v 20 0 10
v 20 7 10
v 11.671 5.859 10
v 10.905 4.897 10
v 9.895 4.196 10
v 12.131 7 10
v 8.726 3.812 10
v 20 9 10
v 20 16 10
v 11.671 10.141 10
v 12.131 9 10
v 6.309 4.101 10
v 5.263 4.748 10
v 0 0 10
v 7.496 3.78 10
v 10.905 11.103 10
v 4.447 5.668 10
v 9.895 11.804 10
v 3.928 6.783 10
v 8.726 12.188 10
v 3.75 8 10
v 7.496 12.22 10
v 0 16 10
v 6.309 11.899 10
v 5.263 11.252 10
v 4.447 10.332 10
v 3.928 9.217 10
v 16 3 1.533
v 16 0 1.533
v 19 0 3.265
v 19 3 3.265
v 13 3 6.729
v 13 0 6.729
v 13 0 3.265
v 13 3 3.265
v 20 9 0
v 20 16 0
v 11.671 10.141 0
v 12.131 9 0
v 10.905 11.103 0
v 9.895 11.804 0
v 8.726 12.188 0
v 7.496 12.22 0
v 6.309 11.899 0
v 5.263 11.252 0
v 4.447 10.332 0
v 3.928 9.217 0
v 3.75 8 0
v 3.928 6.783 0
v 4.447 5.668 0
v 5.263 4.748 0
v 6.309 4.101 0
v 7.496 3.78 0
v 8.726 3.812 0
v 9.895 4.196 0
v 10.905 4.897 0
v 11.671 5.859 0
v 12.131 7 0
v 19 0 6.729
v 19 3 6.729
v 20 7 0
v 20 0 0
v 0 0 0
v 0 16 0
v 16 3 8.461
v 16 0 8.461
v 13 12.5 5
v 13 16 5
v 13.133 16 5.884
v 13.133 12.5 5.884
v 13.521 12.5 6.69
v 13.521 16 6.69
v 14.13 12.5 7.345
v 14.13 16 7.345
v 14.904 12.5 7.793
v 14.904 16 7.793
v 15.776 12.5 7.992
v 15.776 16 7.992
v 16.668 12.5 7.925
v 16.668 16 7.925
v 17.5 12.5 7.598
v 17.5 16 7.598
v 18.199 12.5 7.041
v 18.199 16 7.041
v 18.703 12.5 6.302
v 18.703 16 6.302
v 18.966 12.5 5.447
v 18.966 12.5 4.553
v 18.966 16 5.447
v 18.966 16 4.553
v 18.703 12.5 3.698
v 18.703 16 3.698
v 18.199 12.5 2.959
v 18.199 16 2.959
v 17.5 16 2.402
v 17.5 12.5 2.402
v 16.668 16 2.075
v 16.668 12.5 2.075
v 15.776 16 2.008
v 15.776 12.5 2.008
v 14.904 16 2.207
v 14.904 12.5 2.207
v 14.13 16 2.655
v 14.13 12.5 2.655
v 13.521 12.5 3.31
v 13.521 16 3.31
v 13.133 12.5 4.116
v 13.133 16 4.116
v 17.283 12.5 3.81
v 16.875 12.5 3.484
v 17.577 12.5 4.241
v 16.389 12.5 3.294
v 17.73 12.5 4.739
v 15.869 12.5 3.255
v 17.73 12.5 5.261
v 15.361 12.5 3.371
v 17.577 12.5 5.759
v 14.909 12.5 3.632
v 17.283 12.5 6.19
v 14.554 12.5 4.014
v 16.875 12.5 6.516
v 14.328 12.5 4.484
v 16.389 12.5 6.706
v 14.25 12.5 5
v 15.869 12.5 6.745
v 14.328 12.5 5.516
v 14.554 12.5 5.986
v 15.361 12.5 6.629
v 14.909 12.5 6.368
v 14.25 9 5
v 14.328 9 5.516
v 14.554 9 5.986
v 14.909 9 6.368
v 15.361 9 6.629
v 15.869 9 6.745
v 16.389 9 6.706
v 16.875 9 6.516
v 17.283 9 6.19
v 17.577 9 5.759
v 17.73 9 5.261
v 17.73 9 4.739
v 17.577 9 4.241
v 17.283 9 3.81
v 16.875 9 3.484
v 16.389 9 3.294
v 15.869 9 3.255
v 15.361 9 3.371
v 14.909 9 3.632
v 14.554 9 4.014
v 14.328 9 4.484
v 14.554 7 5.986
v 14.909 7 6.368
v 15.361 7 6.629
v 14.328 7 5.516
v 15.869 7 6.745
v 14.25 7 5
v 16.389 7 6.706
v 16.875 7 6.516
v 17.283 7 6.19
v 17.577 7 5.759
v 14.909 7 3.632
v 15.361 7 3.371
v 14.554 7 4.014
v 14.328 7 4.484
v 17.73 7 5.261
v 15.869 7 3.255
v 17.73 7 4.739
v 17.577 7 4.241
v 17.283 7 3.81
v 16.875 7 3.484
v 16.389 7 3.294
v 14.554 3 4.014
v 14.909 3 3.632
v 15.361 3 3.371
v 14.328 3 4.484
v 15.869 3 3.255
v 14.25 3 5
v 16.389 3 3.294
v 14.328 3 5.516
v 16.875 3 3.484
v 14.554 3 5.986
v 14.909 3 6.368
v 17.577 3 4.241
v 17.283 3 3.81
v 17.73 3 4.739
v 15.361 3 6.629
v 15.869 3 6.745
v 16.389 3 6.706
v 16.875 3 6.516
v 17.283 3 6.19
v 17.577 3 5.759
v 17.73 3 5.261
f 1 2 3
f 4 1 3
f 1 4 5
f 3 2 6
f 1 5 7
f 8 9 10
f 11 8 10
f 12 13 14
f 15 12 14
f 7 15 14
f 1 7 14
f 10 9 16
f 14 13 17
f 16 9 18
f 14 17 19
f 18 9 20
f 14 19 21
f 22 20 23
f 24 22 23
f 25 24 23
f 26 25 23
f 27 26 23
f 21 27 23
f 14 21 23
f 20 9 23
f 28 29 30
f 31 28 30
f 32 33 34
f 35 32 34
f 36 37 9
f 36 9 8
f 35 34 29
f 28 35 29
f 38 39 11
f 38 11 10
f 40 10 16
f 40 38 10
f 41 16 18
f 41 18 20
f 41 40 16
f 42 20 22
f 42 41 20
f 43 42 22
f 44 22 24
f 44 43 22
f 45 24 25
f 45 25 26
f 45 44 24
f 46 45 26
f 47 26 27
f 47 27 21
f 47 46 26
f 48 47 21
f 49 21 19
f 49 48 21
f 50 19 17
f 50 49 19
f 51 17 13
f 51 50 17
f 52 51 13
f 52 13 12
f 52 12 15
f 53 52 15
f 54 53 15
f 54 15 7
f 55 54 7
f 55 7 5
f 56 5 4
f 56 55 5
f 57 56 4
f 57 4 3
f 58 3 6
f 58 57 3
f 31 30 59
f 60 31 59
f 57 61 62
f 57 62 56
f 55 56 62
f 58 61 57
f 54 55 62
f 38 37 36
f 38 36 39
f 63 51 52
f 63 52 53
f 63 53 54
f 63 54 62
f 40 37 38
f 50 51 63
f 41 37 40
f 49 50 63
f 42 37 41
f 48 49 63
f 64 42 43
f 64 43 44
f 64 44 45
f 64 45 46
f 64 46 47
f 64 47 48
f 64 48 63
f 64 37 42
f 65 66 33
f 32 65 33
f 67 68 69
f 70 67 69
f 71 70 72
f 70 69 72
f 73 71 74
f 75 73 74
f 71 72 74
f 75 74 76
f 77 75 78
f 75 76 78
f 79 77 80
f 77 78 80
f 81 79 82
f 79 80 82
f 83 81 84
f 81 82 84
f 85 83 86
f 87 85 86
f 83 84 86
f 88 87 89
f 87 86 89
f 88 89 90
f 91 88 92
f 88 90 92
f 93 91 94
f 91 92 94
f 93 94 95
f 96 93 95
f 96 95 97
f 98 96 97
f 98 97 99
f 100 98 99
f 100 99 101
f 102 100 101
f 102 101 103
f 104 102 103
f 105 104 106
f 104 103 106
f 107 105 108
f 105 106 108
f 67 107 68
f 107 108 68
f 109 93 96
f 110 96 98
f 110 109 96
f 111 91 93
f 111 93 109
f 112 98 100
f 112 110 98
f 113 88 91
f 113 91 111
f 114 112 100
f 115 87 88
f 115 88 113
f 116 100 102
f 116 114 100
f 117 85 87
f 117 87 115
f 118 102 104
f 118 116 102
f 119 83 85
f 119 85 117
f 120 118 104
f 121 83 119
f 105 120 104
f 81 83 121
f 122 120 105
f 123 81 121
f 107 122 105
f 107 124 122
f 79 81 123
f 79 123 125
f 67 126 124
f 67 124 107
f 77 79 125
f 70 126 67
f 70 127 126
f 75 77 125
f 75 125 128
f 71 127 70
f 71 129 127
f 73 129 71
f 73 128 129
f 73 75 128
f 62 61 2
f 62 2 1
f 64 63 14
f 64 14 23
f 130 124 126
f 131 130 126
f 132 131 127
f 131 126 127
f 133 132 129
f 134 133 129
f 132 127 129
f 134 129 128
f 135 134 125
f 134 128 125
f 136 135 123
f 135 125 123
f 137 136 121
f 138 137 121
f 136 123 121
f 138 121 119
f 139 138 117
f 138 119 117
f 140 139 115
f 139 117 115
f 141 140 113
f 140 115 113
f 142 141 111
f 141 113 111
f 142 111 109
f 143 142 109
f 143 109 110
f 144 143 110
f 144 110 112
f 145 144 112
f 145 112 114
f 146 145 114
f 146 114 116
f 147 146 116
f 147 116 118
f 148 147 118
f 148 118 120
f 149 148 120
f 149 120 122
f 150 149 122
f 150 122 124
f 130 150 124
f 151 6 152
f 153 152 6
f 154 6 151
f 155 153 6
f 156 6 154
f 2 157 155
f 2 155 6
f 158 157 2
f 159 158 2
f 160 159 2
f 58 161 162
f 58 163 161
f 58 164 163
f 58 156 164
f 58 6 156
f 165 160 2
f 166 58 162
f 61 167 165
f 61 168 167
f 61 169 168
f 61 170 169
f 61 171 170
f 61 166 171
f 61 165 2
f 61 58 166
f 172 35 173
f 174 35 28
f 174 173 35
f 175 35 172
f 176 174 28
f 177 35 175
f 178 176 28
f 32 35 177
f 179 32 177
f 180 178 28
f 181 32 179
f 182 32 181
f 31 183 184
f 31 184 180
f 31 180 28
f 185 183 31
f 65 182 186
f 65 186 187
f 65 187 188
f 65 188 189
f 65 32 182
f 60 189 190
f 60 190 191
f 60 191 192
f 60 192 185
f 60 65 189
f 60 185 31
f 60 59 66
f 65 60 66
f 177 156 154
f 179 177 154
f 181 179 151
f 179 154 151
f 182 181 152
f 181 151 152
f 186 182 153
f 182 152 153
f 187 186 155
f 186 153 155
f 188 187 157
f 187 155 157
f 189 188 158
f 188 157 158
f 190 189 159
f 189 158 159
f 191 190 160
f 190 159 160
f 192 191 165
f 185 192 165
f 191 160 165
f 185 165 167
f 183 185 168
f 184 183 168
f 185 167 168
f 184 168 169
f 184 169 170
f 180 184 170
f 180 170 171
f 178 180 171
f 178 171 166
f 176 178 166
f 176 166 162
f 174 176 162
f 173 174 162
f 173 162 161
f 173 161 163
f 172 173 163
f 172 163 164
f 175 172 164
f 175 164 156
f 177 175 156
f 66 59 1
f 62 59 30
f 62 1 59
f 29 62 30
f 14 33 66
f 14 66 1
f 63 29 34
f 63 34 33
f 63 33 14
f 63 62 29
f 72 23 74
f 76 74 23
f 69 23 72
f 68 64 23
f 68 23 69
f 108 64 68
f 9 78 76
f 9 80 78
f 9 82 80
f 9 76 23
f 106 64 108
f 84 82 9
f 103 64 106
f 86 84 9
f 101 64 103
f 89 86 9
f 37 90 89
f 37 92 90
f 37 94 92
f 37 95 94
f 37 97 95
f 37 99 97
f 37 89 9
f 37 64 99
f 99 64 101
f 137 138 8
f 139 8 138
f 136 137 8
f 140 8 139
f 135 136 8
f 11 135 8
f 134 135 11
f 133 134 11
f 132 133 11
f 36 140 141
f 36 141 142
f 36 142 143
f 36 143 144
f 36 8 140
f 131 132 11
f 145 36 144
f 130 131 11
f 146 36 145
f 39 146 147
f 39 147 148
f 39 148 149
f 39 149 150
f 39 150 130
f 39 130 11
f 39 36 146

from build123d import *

# Parameters (mm, degrees)
PAD_DEPTH       = 10
SKETCH001_R     = 1.75
POCKET_DEPTH    = 16
SKETCH002_R     = 3
POCKET001_DEPTH = 3.5
POCKET002_DEPTH = 3


with BuildPart() as part:
    # Sketch → Pad (new body)
    with BuildSketch(Plane.XY):
        with BuildLine():
            Line((0, 0), (0, 16))
            Line((0, 16), (20, 16))
            Line((20, 16), (20, 9))
            Line((20, 9), (12.130678, 9))
            ThreePointArc((12.130678, 9), (3.75, 8), (12.130678, 7))
            Line((12.130678, 7), (20, 7))
            Line((20, 7), (20, 0))
            Line((20, 0), (0, 0))
        make_face()
    extrude(amount=PAD_DEPTH)

    # Sketch001 → Pocket (cut)
    with BuildSketch(Plane(origin=(0, 16, 0), x_dir=(-1, 0, 0), z_dir=(0, 1, 0))):
        with Locations((-16, 4.999996)):
            Circle(SKETCH001_R)
    extrude(amount=-POCKET_DEPTH, mode=Mode.SUBTRACT)

    # Sketch002 → Pocket001 (cut)
    with BuildSketch(Plane(origin=(0, 16, 0), x_dir=(-1, 0, 0), z_dir=(0, 1, 0))):
        with Locations((-16, 5)):
            Circle(SKETCH002_R)
    extrude(amount=-POCKET001_DEPTH, mode=Mode.SUBTRACT)

    # Sketch003 → Pocket002 (cut)
    with BuildSketch(Plane.XZ):
        Polygon((15.999999, 8.461405), (13, 6.729354), (13, 3.265252), (16, 1.533202), (19, 3.265253), (19, 6.729355), align=None)
    extrude(amount=-POCKET002_DEPTH, mode=Mode.SUBTRACT)


solid = part.part
